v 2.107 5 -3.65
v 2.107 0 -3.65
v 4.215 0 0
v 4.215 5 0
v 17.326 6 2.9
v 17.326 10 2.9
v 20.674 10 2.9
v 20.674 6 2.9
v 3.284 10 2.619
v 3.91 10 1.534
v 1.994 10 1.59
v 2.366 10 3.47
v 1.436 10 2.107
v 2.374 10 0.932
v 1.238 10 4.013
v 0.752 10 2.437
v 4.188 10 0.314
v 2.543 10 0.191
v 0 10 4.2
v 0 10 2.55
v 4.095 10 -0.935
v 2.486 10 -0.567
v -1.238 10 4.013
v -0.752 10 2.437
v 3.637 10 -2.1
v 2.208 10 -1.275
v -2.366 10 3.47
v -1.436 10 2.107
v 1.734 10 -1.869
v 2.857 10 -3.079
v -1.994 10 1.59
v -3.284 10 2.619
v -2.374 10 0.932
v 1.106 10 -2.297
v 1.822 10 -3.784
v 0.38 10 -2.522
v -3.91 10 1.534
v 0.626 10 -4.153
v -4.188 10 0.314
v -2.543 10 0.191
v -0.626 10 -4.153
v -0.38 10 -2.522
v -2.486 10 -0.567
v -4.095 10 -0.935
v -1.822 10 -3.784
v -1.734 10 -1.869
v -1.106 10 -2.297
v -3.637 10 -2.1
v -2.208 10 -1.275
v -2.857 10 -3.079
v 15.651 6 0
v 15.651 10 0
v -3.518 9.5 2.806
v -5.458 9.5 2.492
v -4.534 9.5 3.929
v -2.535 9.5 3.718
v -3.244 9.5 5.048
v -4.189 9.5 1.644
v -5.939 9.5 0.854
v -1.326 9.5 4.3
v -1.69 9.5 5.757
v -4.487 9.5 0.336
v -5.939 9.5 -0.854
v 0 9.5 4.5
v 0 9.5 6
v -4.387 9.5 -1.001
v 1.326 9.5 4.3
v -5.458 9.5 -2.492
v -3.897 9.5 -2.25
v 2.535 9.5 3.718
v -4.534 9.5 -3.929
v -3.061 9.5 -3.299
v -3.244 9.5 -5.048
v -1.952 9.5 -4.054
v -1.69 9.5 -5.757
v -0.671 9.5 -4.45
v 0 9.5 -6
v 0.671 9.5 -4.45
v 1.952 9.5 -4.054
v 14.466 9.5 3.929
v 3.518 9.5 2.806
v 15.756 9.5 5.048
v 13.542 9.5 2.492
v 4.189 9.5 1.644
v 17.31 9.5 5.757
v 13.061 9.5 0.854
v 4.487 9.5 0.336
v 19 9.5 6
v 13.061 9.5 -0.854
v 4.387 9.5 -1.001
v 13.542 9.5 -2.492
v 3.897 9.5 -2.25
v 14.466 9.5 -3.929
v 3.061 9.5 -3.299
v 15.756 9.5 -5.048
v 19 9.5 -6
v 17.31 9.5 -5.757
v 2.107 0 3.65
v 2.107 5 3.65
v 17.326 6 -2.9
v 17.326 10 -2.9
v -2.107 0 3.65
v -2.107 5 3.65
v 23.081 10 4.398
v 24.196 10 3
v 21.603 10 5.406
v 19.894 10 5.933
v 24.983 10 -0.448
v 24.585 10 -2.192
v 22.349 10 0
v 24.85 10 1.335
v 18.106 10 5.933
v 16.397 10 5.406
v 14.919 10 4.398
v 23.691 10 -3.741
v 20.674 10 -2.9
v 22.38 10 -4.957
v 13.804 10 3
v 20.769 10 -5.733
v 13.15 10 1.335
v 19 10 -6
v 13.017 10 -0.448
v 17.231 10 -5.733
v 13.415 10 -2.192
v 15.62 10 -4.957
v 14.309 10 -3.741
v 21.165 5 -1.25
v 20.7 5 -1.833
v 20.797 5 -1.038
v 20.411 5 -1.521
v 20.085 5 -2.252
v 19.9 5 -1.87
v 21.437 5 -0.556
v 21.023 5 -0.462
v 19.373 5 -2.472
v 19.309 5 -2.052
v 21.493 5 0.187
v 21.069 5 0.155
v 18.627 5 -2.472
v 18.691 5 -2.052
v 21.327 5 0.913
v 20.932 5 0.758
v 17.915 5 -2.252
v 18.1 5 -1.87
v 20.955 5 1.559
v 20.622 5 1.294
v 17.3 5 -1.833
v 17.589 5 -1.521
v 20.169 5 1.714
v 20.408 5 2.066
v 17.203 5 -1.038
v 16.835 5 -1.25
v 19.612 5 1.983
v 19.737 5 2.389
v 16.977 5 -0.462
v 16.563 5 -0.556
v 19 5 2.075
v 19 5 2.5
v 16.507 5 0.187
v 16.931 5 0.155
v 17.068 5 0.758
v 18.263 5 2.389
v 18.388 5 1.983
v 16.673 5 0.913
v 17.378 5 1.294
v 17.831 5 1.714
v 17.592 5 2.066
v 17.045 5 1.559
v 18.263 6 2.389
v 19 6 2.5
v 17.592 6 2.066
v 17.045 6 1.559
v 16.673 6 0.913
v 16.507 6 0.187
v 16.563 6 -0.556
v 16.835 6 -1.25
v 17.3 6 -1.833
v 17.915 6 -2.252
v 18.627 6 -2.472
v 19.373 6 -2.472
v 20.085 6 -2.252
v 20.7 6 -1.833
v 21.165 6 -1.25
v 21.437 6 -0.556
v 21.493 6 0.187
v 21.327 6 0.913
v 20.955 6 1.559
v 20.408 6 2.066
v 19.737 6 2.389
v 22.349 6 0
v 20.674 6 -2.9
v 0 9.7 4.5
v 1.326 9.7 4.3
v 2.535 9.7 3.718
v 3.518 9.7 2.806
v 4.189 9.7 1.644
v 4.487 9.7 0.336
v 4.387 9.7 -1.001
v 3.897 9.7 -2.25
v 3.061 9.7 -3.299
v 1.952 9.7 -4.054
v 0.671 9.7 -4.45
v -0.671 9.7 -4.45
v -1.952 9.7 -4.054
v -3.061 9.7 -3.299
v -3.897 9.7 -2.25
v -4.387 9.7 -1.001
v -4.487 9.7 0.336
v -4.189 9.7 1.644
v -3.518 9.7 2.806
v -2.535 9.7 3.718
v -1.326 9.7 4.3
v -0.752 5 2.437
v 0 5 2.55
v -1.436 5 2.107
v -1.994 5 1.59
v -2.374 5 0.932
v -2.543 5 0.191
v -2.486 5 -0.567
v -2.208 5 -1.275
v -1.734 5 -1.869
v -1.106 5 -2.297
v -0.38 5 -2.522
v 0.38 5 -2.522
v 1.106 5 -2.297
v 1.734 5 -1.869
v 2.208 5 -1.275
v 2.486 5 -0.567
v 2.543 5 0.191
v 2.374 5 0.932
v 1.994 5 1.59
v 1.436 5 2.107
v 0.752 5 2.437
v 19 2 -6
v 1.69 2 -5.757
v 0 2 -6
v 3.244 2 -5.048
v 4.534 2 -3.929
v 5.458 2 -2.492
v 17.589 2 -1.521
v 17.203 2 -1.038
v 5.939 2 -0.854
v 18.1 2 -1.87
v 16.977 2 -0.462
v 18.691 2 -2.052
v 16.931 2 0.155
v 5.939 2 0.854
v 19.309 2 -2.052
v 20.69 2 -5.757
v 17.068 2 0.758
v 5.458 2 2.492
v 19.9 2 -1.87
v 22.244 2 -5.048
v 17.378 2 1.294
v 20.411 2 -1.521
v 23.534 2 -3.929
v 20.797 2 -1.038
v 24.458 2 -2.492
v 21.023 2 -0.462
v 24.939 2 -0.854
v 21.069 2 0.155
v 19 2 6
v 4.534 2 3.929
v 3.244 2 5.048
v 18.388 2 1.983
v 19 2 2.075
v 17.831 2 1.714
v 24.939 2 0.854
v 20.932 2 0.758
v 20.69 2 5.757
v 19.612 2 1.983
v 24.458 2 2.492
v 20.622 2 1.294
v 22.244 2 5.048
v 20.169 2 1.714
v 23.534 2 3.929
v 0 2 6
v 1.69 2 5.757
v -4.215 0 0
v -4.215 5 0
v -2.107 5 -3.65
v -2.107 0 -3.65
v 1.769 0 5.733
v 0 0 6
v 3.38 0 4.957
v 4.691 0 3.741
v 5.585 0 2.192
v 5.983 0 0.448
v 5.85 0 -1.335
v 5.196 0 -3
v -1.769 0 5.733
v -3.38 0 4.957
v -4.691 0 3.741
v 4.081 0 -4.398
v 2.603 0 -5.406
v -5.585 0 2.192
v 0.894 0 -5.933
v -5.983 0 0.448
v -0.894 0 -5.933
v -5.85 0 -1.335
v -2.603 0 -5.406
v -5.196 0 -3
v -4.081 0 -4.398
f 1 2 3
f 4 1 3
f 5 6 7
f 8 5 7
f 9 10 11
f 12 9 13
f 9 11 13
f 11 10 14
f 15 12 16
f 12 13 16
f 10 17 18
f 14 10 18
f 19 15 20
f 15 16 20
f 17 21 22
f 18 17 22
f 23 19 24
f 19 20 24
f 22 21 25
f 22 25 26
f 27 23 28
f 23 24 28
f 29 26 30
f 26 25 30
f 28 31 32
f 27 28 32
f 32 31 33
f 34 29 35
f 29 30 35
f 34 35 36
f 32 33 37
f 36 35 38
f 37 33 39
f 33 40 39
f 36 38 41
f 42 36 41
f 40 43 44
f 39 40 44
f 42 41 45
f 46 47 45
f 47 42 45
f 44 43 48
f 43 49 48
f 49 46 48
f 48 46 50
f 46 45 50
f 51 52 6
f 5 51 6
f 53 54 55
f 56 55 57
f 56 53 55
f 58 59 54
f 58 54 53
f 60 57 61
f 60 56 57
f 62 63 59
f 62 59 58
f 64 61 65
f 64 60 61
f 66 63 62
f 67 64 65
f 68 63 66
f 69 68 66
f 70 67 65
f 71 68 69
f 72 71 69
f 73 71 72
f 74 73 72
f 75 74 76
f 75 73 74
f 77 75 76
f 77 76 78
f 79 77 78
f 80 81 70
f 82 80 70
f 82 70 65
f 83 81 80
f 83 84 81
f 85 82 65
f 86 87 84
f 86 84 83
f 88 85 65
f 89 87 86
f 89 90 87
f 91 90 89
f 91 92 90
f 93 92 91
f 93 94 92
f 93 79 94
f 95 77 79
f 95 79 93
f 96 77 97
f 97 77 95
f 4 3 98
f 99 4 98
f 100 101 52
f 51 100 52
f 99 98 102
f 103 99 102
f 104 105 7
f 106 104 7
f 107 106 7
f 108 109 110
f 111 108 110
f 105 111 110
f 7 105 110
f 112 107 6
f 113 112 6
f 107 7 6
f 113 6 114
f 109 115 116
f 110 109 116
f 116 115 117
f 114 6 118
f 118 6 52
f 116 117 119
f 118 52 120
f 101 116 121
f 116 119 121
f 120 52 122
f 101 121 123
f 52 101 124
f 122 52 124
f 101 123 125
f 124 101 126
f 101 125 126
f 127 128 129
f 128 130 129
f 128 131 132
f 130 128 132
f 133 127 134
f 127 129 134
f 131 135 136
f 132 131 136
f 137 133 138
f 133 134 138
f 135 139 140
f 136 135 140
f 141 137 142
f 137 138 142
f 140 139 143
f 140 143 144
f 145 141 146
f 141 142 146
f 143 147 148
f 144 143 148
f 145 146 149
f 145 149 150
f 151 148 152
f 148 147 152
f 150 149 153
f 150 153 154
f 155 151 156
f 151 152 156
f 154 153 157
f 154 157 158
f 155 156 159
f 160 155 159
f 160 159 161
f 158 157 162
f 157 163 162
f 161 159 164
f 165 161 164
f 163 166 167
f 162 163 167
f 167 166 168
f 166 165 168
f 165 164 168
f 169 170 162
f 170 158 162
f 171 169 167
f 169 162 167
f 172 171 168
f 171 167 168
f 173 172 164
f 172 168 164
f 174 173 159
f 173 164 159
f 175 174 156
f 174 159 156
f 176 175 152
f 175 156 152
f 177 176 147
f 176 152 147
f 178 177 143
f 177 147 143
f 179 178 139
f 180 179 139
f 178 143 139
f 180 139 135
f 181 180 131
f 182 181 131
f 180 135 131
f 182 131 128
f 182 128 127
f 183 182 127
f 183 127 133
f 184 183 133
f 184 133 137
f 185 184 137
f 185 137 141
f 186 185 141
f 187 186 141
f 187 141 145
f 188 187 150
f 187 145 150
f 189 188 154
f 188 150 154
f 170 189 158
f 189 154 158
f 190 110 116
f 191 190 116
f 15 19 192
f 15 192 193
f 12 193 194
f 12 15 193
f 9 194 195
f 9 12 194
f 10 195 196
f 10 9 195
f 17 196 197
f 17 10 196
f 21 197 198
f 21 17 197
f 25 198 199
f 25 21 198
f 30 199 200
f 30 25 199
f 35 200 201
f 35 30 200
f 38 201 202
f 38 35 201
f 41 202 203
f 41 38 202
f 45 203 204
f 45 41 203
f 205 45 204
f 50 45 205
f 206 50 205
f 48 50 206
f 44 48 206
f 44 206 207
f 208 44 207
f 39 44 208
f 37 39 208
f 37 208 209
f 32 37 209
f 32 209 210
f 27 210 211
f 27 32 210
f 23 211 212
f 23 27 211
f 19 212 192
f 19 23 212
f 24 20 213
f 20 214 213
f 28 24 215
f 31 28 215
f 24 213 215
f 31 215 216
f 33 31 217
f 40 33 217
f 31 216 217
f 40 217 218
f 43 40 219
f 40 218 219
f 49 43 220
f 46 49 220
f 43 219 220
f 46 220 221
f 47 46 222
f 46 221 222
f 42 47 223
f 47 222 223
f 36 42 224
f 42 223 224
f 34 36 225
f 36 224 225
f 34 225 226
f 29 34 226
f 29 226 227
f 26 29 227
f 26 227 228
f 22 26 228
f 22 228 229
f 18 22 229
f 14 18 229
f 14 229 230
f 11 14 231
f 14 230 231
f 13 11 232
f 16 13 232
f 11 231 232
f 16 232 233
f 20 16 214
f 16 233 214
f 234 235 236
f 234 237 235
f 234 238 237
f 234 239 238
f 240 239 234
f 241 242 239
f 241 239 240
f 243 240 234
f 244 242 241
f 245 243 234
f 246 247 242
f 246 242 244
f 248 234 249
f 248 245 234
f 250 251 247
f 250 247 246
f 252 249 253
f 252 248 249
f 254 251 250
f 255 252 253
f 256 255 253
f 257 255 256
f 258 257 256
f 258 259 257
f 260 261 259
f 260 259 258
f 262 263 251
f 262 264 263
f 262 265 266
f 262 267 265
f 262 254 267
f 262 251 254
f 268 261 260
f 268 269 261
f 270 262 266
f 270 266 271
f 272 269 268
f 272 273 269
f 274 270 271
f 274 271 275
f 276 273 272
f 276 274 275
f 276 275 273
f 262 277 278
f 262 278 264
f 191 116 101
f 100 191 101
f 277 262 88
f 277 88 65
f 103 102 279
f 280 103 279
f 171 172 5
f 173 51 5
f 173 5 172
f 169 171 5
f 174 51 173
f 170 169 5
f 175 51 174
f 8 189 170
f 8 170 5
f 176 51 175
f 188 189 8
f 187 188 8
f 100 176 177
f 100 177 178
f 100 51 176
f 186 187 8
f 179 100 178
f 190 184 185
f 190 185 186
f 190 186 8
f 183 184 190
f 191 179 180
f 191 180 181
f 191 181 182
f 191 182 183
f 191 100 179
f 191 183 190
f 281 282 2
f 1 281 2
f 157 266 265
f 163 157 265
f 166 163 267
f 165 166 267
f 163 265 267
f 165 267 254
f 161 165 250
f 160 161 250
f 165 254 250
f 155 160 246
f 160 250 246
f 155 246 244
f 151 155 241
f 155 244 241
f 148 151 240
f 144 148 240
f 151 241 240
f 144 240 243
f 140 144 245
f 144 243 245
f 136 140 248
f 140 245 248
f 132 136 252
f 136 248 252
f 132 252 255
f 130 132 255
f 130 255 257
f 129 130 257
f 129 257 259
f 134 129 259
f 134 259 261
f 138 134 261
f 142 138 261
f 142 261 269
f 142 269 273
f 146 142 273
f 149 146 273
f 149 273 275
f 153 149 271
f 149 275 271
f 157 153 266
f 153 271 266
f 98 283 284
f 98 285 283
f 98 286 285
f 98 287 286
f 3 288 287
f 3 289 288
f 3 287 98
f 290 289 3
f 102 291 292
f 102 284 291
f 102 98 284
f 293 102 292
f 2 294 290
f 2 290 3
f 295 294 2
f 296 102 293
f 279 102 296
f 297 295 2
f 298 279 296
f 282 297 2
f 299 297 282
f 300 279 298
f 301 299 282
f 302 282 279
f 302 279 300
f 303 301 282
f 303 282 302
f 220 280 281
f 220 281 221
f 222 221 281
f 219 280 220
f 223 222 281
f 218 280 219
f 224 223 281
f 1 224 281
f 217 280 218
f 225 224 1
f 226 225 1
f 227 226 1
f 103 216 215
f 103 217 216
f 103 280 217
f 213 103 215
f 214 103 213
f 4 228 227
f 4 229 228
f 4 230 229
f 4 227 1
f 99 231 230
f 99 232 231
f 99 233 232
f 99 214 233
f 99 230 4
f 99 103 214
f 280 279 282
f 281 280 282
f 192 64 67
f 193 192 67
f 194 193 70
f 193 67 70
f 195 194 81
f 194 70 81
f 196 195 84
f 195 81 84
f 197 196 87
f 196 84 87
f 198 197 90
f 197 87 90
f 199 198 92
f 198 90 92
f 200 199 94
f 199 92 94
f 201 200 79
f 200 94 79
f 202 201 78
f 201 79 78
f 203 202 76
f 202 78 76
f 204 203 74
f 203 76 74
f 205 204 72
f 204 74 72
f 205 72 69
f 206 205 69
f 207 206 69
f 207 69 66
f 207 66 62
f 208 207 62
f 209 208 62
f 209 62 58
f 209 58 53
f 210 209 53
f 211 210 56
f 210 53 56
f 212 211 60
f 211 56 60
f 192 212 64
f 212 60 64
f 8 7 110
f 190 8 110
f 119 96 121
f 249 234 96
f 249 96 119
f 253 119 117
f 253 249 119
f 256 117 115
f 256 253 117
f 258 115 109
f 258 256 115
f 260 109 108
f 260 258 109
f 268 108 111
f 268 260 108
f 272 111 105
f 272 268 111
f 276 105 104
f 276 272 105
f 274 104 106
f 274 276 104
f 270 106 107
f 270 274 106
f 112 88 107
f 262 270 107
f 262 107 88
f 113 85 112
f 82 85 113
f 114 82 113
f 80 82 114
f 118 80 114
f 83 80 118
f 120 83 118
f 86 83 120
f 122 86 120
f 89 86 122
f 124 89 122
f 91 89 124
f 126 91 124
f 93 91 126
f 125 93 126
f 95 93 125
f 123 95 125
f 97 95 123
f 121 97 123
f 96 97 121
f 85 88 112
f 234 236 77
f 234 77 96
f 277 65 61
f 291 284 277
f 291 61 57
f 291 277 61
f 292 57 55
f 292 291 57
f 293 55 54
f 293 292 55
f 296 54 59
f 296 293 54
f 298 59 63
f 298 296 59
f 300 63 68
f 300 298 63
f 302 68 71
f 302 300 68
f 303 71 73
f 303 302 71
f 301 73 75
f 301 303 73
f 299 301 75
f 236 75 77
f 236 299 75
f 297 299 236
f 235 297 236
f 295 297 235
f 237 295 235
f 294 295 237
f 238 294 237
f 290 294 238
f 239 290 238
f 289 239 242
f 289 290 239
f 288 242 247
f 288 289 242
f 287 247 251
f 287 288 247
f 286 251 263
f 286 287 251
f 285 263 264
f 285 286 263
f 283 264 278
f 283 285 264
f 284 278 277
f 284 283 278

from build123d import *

# Parameters (mm, degrees)
EXTRUDE_1_DEPTH     = 10
CUT_EXTRUDE_1_DEPTH = 5
SKETCH_6_R          = 27.317981471
SKETCH_6_R_2        = 6
CUT_EXTRUDE_2_DEPTH = 2
CUT_EXTRUDE_3_DEPTH = 4
CUT_EXTRUDE_START   = -0.5
SKETCH_8_W          = 36.274656105
SKETCH_8_H          = 16.774008436
SKETCH_8_R          = 6
CUT_EXTRUDE_4_DEPTH = 0.5
SKETCH_9_R          = 6
SKETCH_9_R_2        = 4.5
CUT_EXTRUDE_5_DEPTH = 0.5
CHAMFER_1_SIZE      = 0.3


with BuildPart() as part:
    # 草图1 → 凸台-拉伸1 (new body)
    with BuildSketch(Plane(origin=(0, 0, 0), x_dir=(1, 0, 0), z_dir=(0, 1, 0))):
        with BuildLine():
            Line((0, 6), (19, 6))
            ThreePointArc((19, 6), (25, 0), (19, -6))
            Line((19, -6), (0, -6))
            ThreePointArc((0, -6), (-6, 0), (0, 6))
        make_face()
    extrude(amount=EXTRUDE_1_DEPTH)

    # 草图3 → 切除-旋转2 (revolve, cut)
    with BuildSketch(Plane.XY, mode=Mode.PRIVATE) as cut_revolve_2_sk:
        Polygon((0, 10), (-2.55, 10), (-2.55, 5), (-2.1, 5), (-2.1, 2), (-2.55, 2), (-2.55, 0), (0, 0), align=None)
    revolve(cut_revolve_2_sk.sketch.rotate(Axis((0, 10, 0), (0, -1, 0)), 270), axis=Axis((0, 10, 0), (0, -1, 0)), mode=Mode.SUBTRACT)

    # 草图4 → 切除-旋转3 (revolve, cut)
    with BuildSketch(Plane.XY, mode=Mode.PRIVATE) as cut_revolve_3_sk:
        Polygon((19, 10), (16.5, 10), (16.5, 5), (16.925, 5), (16.925, 0), (19, 0), align=None)
    revolve(cut_revolve_3_sk.sketch.rotate(Axis((19, 10, 0), (0, -1, 0)), 270), axis=Axis((19, 10, 0), (0, -1, 0)), mode=Mode.SUBTRACT)

    # 草图5 → 切除-拉伸1 (cut)
    with BuildSketch(Plane.XZ):
        Polygon((-4.214656965, 0), (-2.107328483, -3.65), (2.107328483, -3.65), (4.214656965, 0), (2.107328483, 3.65), (-2.107328483, 3.65), align=None)
    extrude(amount=-CUT_EXTRUDE_1_DEPTH, mode=Mode.SUBTRACT)

    # 草图6 → 切除-拉伸2 (cut)
    with BuildSketch(Plane.XZ):
        Circle(SKETCH_6_R)
        with Locations(Location((0, 0, 0), (0, 0, 90))):
            Circle(SKETCH_6_R_2, mode=Mode.SUBTRACT)
    extrude(amount=-CUT_EXTRUDE_2_DEPTH, mode=Mode.SUBTRACT)

    # 草图7 → 切除-拉伸3 (cut)
    with BuildSketch(Plane(origin=(0, 10, 0), x_dir=(1, 0, 0), z_dir=(0, 1, 0))):
        Polygon((17.325684219, 2.9), (15.651368439, 0), (17.325684219, -2.9), (20.674315781, -2.9), (22.348631561, 0), (20.674315781, 2.9), align=None)
    extrude(amount=-CUT_EXTRUDE_3_DEPTH, mode=Mode.SUBTRACT)

    # 草图8 → 切除-拉伸4 (cut)
    with BuildSketch(Plane(origin=(0, 10, 0), x_dir=(1, 0, 0), z_dir=(0, 1, 0)).offset(CUT_EXTRUDE_START)):
        with Locations((9.154855794, 0.069028841)):
            Rectangle(SKETCH_8_W, SKETCH_8_H)
        with Locations(Location((0, 0, 0), (0, 0, 270))):
            Circle(SKETCH_8_R, mode=Mode.SUBTRACT)
        with Locations(Location((19, 0, 0), (0, 0, 270))):
            Circle(SKETCH_8_R, mode=Mode.SUBTRACT)
    extrude(amount=CUT_EXTRUDE_4_DEPTH, mode=Mode.SUBTRACT)

    # 草图9 → 切除-拉伸5 (cut)
    with BuildSketch(Plane(origin=(0, 10, 0), x_dir=(1, 0, 0), z_dir=(0, 1, 0)).offset(CUT_EXTRUDE_START)):
        with Locations(Location((0, 0, 0), (0, 0, 270))):
            Circle(SKETCH_9_R)
        with Locations(Location((0, 0, 0), (0, 0, 270))):
            Circle(SKETCH_9_R_2, mode=Mode.SUBTRACT)
    extrude(amount=CUT_EXTRUDE_5_DEPTH, mode=Mode.SUBTRACT)

    # 倒角1
    chamfer_1_edges = [part.edges().sort_by_distance(p)[0] for p in [
        (0, 10, -4.5),
    ]]
    chamfer(chamfer_1_edges, length=CHAMFER_1_SIZE)


solid = part.part
